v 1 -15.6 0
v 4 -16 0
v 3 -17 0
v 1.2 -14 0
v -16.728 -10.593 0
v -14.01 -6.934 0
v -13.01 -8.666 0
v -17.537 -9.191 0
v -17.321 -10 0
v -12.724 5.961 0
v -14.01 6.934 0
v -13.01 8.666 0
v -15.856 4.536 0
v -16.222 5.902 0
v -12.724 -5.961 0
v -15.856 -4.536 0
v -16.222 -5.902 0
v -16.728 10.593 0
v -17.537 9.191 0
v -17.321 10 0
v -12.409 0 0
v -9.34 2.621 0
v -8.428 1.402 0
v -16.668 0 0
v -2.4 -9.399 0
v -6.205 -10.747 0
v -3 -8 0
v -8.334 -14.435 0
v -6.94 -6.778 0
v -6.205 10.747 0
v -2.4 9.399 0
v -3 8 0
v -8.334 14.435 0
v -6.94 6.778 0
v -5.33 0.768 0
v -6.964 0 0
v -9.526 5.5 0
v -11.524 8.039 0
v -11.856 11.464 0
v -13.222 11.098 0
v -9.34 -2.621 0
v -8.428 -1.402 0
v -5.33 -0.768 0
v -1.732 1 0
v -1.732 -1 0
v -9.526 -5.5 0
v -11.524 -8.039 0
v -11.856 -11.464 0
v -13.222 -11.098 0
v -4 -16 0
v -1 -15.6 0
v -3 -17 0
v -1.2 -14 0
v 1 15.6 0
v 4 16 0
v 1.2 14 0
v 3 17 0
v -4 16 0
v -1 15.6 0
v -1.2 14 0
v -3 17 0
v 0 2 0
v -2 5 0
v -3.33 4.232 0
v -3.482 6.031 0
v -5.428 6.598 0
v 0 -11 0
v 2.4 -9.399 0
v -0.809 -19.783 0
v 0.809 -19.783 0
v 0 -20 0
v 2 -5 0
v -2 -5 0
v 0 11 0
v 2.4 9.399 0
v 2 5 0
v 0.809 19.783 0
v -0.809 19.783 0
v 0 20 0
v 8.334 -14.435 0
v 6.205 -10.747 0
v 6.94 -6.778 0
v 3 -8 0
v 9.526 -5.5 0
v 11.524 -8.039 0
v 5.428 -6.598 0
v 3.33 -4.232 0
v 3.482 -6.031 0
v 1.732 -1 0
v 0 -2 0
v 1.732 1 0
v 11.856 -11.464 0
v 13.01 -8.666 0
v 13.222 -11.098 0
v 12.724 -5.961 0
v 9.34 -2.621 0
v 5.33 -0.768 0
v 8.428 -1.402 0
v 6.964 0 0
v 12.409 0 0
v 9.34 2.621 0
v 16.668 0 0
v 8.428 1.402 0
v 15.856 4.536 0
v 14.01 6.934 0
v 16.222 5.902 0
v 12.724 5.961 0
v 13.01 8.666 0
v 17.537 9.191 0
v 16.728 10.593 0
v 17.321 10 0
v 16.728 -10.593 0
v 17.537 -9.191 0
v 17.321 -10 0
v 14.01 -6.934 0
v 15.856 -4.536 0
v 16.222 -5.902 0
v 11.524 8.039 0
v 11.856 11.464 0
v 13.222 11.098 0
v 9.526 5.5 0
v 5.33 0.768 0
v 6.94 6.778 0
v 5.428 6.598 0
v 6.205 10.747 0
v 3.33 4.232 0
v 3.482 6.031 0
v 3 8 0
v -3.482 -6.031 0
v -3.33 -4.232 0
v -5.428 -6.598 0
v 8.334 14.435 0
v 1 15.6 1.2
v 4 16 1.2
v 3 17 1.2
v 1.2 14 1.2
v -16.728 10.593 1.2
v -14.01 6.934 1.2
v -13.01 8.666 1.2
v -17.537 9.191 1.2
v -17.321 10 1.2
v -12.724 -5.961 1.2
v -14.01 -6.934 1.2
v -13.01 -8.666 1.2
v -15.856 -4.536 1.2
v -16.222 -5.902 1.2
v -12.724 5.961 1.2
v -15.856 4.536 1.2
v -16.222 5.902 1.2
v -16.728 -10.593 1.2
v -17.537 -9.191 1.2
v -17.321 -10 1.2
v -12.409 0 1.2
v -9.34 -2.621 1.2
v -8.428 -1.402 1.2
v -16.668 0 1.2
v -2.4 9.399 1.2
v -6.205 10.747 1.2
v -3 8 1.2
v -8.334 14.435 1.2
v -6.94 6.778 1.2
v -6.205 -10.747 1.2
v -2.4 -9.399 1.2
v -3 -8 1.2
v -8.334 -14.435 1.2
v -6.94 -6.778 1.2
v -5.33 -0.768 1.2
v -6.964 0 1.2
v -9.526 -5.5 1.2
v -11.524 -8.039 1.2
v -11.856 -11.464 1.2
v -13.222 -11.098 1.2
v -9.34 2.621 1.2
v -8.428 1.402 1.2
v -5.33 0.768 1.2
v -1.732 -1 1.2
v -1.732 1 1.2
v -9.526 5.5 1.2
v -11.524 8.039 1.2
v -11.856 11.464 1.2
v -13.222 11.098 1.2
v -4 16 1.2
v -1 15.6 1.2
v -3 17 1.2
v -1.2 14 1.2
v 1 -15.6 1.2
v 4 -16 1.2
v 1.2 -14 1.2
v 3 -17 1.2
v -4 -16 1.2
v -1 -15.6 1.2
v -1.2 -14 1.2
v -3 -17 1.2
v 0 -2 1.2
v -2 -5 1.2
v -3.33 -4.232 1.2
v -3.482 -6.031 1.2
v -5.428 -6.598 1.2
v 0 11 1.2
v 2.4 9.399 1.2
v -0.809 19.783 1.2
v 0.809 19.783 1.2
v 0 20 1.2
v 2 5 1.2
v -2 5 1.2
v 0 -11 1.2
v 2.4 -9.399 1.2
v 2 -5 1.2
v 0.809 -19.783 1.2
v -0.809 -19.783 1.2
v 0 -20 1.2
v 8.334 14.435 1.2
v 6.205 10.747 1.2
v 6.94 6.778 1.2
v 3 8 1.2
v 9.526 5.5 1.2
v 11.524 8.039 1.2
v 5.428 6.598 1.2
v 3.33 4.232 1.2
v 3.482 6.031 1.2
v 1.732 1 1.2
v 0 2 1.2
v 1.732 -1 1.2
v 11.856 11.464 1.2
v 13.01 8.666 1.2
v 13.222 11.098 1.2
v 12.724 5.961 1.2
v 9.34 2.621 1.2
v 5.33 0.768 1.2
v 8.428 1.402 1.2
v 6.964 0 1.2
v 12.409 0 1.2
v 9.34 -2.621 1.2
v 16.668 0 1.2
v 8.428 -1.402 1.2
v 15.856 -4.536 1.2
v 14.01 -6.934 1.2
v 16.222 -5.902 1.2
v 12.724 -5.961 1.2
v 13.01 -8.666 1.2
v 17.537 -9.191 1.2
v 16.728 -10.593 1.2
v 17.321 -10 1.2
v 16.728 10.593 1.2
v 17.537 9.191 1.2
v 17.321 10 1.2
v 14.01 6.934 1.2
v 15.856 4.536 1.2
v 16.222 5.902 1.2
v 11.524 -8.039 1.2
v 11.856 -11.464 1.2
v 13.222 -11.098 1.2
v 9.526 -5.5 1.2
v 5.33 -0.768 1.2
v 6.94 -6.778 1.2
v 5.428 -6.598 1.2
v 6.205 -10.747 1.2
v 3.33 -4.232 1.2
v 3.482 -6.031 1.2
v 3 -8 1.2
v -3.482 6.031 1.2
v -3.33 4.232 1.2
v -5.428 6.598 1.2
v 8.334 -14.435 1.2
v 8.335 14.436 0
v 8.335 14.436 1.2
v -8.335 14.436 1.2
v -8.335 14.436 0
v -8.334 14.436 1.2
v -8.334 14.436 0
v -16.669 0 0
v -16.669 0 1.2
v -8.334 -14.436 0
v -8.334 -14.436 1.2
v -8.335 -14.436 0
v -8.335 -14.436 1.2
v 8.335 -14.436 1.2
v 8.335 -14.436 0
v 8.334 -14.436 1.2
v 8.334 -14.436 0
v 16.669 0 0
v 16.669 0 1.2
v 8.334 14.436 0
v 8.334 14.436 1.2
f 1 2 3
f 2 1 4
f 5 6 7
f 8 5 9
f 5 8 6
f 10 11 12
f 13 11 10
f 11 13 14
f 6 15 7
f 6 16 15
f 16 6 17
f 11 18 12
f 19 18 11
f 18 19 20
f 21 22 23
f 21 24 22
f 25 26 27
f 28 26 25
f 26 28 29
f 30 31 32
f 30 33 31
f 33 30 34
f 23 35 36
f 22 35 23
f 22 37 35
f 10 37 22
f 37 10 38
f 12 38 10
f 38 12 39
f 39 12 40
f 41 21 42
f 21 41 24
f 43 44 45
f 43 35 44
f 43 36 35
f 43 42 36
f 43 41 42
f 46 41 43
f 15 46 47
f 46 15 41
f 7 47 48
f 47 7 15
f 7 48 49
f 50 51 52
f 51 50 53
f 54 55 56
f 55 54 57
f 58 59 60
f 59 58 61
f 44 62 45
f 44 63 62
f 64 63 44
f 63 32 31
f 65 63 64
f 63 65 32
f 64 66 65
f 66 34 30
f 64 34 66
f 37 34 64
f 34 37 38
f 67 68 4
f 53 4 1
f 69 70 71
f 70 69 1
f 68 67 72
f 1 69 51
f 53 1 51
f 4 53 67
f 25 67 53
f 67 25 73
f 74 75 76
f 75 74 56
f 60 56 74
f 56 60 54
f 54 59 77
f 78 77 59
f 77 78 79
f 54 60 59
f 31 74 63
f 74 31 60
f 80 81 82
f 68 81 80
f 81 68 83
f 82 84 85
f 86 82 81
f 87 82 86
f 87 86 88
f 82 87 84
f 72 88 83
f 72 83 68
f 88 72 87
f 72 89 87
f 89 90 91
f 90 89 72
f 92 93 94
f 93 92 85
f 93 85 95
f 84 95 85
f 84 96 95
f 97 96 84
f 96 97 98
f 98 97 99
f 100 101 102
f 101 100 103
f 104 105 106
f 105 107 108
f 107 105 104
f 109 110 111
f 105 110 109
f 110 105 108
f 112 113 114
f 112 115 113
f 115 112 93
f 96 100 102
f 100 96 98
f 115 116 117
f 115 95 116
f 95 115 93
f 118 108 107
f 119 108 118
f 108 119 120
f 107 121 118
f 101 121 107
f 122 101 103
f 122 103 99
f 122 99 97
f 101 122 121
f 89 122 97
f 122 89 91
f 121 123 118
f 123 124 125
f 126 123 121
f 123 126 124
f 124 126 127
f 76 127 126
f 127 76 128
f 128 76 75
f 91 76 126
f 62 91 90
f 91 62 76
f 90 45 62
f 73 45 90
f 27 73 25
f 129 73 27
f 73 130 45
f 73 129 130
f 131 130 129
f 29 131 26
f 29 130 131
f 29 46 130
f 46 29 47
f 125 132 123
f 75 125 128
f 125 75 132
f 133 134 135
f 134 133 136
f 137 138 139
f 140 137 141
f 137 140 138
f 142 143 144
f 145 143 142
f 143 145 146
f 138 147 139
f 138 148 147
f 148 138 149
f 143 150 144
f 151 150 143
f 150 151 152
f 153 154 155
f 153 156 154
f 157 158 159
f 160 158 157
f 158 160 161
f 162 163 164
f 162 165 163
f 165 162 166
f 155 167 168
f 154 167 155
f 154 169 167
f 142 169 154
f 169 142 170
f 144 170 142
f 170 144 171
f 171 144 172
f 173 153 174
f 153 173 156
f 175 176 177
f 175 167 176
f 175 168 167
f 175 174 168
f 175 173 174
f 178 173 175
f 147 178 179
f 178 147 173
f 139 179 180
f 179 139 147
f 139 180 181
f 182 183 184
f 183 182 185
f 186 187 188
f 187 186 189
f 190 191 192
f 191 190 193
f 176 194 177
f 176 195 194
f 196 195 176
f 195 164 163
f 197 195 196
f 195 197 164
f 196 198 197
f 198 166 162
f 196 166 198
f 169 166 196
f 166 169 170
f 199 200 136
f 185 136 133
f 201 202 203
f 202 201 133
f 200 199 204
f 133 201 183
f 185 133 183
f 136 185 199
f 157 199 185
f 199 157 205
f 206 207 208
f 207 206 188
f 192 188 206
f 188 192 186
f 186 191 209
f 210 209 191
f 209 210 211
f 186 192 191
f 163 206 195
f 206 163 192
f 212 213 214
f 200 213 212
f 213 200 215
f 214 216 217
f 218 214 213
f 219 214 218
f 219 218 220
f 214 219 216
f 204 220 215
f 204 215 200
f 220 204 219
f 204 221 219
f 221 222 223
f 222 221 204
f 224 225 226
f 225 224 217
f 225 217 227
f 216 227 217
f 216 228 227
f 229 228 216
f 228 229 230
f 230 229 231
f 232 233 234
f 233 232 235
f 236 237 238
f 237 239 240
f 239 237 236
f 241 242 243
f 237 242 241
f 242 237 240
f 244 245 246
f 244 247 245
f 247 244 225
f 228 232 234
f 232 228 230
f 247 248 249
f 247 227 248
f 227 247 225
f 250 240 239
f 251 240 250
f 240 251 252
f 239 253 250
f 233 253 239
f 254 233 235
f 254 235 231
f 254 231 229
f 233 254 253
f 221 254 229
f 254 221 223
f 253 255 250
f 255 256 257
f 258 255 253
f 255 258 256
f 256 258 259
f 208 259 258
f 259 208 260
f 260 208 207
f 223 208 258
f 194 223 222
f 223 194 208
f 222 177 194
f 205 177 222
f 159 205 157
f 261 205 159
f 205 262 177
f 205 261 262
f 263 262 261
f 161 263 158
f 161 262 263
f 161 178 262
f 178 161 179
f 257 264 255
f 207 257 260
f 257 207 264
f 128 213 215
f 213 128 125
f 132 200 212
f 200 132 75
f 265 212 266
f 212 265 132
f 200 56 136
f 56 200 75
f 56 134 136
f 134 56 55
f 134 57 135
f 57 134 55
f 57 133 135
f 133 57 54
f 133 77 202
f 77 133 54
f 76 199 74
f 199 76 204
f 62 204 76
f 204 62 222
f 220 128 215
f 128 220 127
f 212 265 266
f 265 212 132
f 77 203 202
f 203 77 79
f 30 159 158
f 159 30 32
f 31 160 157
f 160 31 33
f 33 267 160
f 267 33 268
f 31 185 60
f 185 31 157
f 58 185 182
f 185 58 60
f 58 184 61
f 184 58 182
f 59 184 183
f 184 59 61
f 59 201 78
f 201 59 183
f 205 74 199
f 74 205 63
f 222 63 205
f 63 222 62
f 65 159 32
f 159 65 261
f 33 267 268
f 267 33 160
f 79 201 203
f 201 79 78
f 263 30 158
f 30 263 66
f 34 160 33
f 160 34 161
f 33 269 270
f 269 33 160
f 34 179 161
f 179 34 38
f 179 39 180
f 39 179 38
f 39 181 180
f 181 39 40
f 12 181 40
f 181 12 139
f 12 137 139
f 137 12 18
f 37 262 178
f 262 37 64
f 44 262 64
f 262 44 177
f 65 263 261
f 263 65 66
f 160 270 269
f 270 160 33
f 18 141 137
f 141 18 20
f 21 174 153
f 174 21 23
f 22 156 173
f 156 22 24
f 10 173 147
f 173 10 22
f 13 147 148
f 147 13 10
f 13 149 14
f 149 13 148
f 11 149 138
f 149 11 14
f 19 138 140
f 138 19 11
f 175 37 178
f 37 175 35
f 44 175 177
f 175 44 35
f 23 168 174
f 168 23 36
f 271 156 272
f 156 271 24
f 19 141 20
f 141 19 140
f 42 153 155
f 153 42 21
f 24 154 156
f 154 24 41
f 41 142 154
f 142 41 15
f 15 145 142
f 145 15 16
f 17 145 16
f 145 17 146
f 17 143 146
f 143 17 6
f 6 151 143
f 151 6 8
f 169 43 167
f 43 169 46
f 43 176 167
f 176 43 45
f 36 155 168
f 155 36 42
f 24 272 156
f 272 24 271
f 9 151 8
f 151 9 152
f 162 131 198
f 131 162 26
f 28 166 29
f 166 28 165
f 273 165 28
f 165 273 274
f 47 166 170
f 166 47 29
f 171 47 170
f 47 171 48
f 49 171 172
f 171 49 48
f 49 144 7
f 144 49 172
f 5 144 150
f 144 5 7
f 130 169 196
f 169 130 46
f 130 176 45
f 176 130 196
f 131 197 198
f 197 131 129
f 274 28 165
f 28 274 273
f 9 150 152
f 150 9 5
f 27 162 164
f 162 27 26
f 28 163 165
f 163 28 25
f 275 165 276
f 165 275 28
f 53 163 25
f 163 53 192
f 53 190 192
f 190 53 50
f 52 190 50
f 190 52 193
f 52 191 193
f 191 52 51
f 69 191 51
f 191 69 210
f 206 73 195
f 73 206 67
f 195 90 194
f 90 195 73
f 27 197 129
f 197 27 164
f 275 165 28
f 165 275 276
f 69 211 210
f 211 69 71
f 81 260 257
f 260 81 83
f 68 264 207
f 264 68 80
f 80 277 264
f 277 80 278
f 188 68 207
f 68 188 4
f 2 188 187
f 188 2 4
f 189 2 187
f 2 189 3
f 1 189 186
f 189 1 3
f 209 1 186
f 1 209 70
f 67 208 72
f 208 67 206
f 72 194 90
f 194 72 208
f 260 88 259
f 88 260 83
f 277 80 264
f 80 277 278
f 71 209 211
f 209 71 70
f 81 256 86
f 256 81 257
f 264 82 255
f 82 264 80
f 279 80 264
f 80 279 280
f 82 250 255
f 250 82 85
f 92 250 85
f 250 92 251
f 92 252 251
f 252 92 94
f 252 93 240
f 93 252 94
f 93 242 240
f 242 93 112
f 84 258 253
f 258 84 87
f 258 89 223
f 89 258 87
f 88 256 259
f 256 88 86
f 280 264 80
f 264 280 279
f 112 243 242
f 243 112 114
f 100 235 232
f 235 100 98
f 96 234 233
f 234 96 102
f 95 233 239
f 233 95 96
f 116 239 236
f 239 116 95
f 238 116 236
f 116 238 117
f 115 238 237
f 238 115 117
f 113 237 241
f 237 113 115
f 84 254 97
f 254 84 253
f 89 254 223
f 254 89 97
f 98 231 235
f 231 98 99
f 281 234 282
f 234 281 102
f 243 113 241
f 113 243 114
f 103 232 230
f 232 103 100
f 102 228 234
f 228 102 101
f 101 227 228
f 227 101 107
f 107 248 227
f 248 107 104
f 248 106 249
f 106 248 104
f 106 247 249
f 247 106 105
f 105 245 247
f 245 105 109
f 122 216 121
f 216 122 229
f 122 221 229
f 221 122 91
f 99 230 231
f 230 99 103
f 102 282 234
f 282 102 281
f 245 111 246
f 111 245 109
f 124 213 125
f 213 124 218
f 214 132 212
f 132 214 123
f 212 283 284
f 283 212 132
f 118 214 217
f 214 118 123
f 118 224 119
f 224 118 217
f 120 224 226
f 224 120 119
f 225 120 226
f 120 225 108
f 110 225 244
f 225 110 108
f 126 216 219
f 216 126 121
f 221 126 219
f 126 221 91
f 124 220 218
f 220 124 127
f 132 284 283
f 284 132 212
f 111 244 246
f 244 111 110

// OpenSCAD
// mathgrrl customizable snowflake cutter

// thanks atartanian for suggesting how to speed up the code
// thanks anoved for commenting your lathe code so well for me to learn

// preview[view:south, tilt:top]

/* [Cut] */

// Sketch the design that will be mirrored and rotated to make the snowflake. Only the parts of your design that end up inside the green triangular region will be used; anything outside of that will be truncated. 
cuts = [[[0,0],[.124,0],[.075,.2],[.25,.35],[.225,.375],[.06,.235],[.03,.35],[.1,.4],[.075,.425],[.025,.39],[.02,.5],[0,.5],[0,.275],[.05,.125],[0,.05]],[[0,1,2,3,4,5,6,7,8,9,10,11,12,13,14]]]; // [draw_polygon]

/* [Parameters] */

// (print height, in mm)
thickness = 1.2; 

// (diameter of enclosing circle, in mm)
size = 40;

// (for hanging)
loop = 0; //[0:No,1:Yes]

/////////////////////////////////////////////////////////////////////////
// renders

// guide triangle
color("lime")
%linear_extrude(height=2)
union(){
    hull(){
        circle(.1);
        translate([19.9/sqrt(3),19.9,0]) circle(.1);
    }
    hull(){
        translate([19.9/sqrt(3),19.9,0]) circle(.1);
        translate([0,19.9,0]) circle(.1);
    }
    hull(){
        translate([0,19.9,0]) circle(.1);
        circle(.1);
    }
}

// guide box
color([.8,.8,.8]) 
translate([0,0,-1]) %cube([40,40,1],center=true);

// tiny dot to avoid errors
cylinder(r=.1,h=.1);

// make the flake!
color("white")
difference(){
	union(){
		// draw the snowflake
		snowflake();
		// also draw outer loop, if desired
		if (loop==1){
			translate([0,size/2-.1*size,0])
			linear_extrude(height=thickness)
			circle(.1*size,$fn=24);
		}
	}
	// take away inner loop, if desired
	if (loop==1){
		translate([0,size/2-.1*size,-1])
		linear_extrude(height=thickness+2)
		circle(.05*size,$fn=24);
	}
}

/////////////////////////////////////////////////////////////////////////
// make snowflake out of cut piece

module snowflake(){
	scale(size)
		for (i=[0:5]){
			rotate(60*i,[0,0,1])
				union(){
					piece();
					mirror([1,0,0]) piece();
				}
		}
}

/////////////////////////////////////////////////////////////////////////
// make the cut piece from the sketch

module piece(){
	intersection(){
		linear_extrude(height=thickness/size)
		polygon(
			points=cuts[0], 
			paths=cuts[1]
		); 
		linear_extrude(height=thickness/size)
		polygon(
			points=[[0,0],[.5*cos(60),.5*sin(60)],[0,.5]],
			paths=[[0,1,2]]
		);
	}
}
